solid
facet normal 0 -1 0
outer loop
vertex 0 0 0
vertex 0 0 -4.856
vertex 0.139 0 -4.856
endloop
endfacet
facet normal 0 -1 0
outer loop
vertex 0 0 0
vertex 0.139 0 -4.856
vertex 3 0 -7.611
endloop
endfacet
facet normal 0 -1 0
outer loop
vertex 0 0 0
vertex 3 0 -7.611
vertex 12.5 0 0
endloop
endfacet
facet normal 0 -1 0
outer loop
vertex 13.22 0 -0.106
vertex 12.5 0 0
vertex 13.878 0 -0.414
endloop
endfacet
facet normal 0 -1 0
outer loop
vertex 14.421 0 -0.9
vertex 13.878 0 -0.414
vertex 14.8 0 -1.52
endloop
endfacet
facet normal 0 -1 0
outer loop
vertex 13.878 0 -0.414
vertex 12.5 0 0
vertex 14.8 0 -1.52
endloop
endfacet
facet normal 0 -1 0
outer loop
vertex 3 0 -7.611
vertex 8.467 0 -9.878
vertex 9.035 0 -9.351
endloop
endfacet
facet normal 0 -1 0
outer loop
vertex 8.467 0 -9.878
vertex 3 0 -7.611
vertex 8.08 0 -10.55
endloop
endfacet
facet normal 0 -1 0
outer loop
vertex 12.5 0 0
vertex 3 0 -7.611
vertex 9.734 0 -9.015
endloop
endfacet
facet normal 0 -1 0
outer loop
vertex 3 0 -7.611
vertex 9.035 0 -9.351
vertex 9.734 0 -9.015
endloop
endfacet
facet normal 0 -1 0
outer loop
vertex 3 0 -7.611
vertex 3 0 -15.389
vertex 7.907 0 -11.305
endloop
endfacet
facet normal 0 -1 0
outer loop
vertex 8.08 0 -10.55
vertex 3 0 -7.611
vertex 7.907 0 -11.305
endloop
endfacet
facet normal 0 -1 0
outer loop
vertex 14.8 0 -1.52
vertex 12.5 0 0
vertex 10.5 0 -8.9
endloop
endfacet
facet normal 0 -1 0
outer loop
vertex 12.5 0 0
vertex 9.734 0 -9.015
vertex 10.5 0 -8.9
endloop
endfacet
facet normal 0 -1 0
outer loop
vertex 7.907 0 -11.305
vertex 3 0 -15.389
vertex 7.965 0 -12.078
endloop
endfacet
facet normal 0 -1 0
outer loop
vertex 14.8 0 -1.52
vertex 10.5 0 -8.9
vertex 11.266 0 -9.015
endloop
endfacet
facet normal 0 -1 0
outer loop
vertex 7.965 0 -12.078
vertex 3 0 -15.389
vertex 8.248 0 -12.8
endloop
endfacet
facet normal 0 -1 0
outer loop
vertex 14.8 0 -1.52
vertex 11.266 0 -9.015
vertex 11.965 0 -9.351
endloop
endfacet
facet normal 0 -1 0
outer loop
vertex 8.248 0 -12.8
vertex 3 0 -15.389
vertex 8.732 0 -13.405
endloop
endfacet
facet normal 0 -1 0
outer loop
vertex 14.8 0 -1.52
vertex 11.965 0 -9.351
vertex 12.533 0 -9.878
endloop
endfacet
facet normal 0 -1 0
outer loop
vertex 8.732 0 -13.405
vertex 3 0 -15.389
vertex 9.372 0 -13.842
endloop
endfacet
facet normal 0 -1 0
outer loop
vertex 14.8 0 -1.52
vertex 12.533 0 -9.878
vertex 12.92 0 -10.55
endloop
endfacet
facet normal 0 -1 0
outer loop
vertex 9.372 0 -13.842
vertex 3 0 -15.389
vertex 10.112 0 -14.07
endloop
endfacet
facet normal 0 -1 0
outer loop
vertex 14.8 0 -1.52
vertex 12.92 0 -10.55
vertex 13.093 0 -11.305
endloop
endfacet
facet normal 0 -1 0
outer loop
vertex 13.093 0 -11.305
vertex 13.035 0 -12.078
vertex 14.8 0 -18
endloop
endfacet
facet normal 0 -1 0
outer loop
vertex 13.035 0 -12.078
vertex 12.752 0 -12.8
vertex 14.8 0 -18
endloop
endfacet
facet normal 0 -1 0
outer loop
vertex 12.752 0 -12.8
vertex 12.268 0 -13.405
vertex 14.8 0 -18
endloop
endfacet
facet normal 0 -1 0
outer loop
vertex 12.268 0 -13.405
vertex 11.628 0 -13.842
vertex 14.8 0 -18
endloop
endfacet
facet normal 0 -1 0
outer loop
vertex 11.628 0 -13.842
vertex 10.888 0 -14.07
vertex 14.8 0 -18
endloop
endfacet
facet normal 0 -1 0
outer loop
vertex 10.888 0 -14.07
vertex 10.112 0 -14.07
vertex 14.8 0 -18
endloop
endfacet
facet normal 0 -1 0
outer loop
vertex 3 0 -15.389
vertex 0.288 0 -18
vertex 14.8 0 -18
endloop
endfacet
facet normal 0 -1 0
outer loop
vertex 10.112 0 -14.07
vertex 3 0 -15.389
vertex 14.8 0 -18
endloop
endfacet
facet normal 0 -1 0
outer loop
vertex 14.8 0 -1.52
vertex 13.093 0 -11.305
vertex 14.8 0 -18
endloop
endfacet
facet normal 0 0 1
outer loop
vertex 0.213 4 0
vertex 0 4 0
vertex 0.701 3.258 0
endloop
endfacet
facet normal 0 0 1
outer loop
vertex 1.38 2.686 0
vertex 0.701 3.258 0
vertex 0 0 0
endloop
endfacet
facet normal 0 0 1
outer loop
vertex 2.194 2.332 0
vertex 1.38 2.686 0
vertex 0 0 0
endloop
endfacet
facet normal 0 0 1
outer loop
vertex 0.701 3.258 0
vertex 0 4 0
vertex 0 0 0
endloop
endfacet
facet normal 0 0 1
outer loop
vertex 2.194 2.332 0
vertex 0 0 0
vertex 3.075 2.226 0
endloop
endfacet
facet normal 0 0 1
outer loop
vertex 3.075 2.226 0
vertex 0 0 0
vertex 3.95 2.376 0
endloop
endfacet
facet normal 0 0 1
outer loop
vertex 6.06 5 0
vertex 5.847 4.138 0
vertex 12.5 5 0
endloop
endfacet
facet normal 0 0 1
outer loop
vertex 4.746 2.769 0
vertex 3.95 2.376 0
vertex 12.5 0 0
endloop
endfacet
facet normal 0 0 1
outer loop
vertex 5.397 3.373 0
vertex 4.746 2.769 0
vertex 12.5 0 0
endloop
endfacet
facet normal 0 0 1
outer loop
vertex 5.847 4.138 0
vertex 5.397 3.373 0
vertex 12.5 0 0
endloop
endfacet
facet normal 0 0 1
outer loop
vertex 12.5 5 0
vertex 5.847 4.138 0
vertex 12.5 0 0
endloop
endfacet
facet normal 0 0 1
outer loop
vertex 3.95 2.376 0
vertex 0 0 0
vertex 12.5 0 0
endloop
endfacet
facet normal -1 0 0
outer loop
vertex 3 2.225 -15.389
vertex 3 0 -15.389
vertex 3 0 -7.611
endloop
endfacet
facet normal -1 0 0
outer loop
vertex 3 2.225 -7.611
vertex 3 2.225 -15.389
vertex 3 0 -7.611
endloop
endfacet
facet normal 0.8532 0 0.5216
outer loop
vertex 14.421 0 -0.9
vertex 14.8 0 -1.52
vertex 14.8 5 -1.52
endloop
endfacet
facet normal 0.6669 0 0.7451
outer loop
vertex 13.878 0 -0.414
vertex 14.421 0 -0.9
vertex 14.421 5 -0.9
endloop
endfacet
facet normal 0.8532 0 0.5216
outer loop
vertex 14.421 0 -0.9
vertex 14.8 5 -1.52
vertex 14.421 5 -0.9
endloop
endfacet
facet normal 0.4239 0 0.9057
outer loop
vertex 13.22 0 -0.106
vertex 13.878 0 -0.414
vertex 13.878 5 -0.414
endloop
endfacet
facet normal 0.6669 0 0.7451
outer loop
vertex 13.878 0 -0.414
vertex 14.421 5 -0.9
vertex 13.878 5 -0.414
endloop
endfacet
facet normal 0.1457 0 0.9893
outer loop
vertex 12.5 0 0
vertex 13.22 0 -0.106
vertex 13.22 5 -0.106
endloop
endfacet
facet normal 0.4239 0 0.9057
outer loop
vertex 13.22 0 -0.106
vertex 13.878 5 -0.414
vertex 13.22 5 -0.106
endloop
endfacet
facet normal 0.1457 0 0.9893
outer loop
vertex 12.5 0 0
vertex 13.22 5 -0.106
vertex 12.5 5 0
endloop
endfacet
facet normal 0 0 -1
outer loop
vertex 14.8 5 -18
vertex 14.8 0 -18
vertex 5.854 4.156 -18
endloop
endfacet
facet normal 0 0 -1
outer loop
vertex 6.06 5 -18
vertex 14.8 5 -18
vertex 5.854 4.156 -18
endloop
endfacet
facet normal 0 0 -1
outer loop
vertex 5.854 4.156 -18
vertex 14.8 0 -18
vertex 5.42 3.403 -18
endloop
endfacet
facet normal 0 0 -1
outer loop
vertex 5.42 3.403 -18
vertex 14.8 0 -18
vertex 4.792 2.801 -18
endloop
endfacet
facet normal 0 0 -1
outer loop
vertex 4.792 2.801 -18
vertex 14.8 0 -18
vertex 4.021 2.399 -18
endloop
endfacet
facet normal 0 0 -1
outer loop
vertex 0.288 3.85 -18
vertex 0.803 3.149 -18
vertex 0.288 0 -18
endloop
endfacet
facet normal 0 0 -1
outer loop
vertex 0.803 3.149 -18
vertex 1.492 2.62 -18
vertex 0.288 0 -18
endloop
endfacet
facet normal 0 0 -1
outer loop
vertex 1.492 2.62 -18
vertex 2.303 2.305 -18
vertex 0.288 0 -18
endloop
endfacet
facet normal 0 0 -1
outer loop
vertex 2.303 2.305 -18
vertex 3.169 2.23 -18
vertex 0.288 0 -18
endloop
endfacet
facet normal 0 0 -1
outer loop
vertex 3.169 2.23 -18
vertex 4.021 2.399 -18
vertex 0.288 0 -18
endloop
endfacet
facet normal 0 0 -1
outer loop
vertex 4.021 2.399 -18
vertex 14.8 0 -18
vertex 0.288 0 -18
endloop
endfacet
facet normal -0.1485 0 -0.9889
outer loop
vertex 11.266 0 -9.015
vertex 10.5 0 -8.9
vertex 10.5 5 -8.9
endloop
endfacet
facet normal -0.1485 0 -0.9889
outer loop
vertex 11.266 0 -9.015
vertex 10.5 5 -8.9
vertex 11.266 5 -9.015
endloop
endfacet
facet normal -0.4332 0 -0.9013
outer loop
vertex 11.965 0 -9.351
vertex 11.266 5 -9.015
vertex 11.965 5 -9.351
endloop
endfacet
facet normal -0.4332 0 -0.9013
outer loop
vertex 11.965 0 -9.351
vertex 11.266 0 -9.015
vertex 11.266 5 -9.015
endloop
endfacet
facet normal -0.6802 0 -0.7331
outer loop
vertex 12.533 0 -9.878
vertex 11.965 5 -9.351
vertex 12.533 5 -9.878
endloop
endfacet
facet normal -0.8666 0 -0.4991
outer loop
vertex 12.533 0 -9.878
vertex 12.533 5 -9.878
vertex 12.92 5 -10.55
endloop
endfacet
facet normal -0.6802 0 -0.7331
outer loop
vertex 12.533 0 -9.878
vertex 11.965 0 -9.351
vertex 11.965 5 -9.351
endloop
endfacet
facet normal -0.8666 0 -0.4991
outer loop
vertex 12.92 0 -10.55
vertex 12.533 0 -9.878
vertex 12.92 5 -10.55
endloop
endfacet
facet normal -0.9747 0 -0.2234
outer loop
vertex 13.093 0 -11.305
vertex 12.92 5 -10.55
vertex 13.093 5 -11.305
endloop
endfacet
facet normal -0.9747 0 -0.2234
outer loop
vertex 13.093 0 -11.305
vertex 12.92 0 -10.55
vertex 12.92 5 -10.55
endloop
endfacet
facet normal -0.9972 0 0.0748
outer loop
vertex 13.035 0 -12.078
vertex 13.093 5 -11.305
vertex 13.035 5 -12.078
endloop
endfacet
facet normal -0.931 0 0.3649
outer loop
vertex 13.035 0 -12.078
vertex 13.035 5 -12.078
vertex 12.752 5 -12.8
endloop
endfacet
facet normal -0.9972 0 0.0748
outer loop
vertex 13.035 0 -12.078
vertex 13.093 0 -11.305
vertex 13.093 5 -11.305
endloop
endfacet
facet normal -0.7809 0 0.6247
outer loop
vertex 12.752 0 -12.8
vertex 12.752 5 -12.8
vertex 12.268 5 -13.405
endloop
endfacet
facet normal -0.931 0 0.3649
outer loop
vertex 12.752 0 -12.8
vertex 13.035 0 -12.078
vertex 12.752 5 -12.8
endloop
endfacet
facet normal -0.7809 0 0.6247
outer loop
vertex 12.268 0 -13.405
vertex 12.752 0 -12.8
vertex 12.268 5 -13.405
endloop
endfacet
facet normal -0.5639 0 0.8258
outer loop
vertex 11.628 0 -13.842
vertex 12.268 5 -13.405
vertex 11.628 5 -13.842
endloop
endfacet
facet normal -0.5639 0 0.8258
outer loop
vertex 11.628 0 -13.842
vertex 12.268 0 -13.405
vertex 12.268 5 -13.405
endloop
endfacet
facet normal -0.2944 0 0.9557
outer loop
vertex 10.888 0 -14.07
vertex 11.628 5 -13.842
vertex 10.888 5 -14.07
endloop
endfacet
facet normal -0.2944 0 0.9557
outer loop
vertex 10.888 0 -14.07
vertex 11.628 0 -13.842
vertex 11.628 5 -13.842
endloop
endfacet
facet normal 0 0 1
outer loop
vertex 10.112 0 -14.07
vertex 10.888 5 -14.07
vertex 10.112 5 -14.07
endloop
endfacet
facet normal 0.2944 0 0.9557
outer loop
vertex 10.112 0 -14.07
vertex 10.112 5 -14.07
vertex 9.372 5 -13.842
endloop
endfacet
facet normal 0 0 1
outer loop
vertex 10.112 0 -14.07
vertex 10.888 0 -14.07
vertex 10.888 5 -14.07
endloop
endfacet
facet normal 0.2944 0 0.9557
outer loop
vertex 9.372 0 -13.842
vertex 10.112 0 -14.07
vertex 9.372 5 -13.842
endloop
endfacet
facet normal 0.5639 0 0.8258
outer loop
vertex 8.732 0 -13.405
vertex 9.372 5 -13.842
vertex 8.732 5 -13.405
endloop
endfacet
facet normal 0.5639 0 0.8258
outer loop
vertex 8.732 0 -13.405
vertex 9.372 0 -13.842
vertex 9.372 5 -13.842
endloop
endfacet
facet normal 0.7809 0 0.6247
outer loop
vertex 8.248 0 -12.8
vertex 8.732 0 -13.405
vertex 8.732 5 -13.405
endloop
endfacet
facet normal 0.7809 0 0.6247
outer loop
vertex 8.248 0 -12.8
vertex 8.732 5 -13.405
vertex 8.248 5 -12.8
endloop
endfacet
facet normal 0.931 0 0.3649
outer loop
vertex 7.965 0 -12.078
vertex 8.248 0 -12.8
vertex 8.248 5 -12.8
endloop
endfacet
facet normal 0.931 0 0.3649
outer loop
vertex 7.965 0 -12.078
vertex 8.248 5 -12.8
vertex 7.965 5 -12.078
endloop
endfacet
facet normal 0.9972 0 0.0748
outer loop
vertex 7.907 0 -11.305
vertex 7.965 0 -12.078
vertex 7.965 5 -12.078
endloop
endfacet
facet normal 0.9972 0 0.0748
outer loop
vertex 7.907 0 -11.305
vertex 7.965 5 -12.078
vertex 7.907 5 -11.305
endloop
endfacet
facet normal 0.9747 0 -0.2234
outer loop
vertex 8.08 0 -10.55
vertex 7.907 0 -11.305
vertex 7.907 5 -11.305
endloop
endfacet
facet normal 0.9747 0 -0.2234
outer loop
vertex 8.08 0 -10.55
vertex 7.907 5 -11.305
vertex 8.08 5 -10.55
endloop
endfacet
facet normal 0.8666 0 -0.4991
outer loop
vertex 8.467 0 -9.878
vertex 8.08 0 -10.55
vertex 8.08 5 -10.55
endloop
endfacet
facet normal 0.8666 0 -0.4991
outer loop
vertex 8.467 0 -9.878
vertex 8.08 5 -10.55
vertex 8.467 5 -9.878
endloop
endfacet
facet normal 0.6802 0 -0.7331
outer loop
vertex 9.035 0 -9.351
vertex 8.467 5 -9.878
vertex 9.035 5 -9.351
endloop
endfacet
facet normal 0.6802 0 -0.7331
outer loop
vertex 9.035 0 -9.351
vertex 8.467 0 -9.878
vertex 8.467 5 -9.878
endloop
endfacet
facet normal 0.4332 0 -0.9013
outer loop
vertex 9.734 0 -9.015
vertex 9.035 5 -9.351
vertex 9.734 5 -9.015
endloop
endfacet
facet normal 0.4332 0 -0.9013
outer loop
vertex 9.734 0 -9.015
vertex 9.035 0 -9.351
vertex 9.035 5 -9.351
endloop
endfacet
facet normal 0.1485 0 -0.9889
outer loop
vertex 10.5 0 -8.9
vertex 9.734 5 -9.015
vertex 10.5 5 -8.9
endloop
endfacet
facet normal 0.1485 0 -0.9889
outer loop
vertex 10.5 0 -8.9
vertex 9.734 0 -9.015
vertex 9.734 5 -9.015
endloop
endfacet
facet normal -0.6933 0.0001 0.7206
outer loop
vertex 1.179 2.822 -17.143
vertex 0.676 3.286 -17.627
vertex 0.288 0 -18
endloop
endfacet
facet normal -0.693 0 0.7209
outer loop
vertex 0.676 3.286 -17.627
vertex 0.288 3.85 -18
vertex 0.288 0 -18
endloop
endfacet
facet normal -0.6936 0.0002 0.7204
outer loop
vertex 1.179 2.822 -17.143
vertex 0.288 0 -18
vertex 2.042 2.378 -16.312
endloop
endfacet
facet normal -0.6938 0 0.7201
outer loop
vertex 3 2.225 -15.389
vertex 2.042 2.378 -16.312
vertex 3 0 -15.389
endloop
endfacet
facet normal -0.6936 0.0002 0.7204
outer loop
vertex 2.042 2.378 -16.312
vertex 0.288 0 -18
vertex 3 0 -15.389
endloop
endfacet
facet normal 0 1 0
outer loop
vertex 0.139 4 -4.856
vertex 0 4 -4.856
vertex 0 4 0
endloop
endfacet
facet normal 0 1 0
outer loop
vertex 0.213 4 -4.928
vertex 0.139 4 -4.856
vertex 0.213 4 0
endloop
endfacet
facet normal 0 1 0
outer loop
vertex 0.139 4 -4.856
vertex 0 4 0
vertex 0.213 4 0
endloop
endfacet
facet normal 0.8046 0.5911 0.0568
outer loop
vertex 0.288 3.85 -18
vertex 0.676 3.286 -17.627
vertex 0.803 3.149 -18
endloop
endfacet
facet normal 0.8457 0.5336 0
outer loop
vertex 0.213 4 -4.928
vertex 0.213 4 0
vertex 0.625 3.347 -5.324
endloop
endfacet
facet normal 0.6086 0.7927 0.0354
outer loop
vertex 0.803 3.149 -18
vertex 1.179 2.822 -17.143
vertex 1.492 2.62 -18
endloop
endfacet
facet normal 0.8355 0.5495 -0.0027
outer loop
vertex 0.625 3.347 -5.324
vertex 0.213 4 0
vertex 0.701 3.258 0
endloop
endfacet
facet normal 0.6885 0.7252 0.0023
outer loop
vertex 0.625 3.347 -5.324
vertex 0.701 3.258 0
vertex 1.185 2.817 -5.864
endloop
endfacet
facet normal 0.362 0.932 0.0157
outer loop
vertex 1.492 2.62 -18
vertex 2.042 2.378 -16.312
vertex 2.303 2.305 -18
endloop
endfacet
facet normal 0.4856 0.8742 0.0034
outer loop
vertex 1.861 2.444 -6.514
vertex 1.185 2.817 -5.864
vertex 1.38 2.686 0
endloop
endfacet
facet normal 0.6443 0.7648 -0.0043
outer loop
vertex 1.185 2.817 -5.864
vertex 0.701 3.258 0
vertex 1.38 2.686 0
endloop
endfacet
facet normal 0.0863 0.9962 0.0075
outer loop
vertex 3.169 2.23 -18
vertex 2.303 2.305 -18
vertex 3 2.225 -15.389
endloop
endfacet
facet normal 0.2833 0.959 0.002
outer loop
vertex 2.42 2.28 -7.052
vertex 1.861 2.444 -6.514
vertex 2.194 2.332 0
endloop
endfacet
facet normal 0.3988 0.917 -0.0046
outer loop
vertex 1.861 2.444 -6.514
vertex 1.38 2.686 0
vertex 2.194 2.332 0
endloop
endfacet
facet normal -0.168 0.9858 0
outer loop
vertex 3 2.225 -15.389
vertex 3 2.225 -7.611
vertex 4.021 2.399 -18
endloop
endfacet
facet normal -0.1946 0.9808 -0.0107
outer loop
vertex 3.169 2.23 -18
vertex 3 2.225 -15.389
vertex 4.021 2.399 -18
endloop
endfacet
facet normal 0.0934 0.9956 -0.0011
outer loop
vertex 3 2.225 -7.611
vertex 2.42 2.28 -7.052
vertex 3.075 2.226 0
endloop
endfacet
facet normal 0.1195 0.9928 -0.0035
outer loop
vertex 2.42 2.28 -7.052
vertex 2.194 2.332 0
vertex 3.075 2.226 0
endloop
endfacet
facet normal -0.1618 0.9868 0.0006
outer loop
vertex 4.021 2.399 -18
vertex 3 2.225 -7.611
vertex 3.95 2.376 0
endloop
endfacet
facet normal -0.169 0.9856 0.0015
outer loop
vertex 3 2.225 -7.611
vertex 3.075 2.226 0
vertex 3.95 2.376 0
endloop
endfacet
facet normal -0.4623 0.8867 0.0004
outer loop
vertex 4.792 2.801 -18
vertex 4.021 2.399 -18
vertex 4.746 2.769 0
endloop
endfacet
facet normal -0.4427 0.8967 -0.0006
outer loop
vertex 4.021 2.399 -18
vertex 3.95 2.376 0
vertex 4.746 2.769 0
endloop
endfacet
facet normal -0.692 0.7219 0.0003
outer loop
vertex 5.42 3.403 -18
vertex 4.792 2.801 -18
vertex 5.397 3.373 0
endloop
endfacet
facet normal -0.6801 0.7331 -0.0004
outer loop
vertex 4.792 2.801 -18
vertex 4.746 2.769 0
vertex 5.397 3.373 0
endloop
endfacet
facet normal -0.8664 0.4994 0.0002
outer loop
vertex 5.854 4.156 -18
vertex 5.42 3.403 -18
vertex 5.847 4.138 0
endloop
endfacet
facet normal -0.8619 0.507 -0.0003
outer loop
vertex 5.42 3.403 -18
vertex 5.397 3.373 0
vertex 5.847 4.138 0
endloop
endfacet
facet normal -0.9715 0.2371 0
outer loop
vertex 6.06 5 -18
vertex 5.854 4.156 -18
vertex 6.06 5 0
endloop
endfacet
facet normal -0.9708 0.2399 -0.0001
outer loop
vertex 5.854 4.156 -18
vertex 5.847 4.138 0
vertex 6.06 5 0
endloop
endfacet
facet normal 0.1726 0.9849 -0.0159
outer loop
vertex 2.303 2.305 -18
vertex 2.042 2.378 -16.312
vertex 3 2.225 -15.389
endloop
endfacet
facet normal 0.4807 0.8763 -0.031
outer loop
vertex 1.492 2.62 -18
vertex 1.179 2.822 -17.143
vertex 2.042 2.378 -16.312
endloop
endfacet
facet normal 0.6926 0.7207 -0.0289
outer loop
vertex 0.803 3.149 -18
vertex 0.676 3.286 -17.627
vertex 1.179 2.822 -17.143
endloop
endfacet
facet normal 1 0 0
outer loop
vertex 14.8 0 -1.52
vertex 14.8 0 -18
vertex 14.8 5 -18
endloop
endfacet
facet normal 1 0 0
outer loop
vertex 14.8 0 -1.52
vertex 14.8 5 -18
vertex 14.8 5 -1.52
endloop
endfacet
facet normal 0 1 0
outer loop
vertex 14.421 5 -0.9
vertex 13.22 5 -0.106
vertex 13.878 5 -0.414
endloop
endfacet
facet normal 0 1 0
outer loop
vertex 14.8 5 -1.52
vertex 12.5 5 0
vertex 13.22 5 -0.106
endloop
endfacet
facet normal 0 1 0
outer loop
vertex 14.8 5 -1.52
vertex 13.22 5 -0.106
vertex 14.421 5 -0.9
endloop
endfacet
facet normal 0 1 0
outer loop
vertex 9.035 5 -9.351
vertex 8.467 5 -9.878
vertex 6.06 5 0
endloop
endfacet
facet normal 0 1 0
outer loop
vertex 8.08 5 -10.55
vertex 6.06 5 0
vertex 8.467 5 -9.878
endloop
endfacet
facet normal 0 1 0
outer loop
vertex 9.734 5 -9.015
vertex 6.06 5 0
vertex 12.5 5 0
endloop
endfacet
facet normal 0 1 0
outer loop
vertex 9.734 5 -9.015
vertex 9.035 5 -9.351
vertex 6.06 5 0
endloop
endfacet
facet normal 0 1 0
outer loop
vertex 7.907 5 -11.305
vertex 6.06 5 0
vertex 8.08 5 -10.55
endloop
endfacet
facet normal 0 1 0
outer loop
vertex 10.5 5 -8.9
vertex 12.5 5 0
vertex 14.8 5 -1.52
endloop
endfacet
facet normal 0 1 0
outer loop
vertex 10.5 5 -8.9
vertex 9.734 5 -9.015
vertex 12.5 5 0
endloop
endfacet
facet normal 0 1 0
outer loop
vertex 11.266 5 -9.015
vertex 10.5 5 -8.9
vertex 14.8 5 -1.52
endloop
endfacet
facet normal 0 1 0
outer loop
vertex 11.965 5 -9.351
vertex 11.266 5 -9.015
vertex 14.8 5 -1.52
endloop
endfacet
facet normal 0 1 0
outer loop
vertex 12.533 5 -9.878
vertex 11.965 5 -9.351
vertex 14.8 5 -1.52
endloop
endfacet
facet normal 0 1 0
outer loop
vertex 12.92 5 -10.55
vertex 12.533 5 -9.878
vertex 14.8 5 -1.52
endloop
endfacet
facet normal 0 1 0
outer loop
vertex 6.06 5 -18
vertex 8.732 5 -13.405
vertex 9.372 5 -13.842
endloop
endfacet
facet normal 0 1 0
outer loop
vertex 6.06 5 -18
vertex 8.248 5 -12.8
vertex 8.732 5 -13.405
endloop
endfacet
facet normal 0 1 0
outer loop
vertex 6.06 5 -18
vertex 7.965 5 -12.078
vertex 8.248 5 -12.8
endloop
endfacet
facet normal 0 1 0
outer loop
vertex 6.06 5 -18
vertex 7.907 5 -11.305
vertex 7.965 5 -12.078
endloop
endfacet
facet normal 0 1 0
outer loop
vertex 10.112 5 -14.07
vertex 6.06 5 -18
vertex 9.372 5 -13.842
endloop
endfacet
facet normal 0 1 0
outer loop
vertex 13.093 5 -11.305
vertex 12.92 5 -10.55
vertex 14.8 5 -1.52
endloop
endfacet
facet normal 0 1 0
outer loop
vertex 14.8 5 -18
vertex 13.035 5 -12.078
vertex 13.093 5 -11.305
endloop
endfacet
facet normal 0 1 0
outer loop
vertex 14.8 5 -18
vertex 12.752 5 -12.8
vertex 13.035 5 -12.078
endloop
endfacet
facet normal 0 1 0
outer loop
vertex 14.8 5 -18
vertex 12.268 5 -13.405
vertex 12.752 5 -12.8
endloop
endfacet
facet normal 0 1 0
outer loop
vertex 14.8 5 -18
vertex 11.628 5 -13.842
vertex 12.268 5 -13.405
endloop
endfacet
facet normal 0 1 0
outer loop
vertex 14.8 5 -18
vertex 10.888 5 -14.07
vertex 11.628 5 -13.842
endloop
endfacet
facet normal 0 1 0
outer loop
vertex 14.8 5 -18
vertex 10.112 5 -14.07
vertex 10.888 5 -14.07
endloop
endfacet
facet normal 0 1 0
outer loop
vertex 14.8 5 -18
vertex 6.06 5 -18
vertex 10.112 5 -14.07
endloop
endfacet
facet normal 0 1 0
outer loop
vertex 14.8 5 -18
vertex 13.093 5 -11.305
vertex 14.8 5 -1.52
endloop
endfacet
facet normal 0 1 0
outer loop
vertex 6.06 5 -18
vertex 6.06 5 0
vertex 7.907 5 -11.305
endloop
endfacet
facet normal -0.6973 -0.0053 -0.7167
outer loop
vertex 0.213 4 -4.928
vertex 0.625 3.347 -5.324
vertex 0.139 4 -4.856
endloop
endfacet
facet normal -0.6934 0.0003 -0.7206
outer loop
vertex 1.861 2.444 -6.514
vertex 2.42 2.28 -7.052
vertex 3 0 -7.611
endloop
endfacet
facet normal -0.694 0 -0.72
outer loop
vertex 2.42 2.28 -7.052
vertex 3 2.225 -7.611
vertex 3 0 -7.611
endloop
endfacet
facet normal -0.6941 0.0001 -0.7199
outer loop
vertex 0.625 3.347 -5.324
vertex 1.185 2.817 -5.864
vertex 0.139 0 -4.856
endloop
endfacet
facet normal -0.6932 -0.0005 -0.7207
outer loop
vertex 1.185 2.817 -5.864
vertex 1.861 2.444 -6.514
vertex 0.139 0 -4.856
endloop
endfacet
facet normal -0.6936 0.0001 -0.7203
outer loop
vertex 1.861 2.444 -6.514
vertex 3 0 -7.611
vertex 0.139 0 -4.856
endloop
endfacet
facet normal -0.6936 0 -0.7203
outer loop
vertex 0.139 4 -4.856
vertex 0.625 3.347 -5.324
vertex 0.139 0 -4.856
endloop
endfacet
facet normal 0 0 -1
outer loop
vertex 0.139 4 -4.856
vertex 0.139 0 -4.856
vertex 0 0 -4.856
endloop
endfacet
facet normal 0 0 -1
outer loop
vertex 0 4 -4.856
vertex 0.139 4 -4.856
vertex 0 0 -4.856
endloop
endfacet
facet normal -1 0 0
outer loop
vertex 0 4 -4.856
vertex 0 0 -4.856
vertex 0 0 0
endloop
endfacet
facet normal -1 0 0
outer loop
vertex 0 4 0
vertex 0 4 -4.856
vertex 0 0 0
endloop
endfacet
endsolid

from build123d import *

# Parameters (mm, degrees)
BOSS_EXTRUDE1_DEPTH      = 5
BOSS_EXTRUDE1_DEPTH_BACK = 0.0001
SKETCH1_R                = 2.6
SKETCH2_R                = 3.075
CUT_EXTRUDE1_DEPTH       = 24.958297101
FILLET1_R                = 2.5
SKETCH3_W                = 0.717338371
SKETCH3_H                = 1
CUT_EXTRUDE2_DEPTH       = 24.958297101
SKETCH4_W                = 0.2
SKETCH4_H                = 18
CUT_EXTRUDE3_DEPTH       = 24.958317971


with BuildPart() as part:
    # Sketch1 → Boss-Extrude1 (new, two sides: drawn at the far end of the back side and taken through both)
    with BuildSketch(Plane(origin=(0, 0, 0), x_dir=(1, 0, 0), z_dir=(0, 1, 0)).offset(-BOSS_EXTRUDE1_DEPTH_BACK)):
        Polygon((0, 18), (2.8, 15.304069131), (2.8, 7.695628029), (0, 5), (0, 0), (15, 0), (15, 18), align=None)
        with Locations(Location((10.5, 11.499529694, 0), (0, 0, 270))):
            Circle(SKETCH1_R, mode=Mode.SUBTRACT)
    extrude(amount=BOSS_EXTRUDE1_DEPTH + BOSS_EXTRUDE1_DEPTH_BACK)

    # Sketch2 → Cut-Extrude1 (cut, through all)
    with BuildSketch(Plane.XY):
        with Locations((3, 5.3)):
            Circle(SKETCH2_R)
    extrude(amount=-CUT_EXTRUDE1_DEPTH, mode=Mode.SUBTRACT)

    # Fillet1
    fillet1_edges = [part.edges().sort_by_distance(p)[0] for p in [
        (15, 2.49995, 0),
    ]]
    fillet(fillet1_edges, radius=FILLET1_R)

    # Sketch3 → Cut-Extrude2 (cut, through all)
    with BuildSketch(Plane.XY):
        with Locations((0.358669186, 4.5)):
            Rectangle(SKETCH3_W, SKETCH3_H)
    extrude(amount=-CUT_EXTRUDE2_DEPTH, mode=Mode.SUBTRACT)

    # Sketch4 → Cut-Extrude3 (cut, through all)
    with BuildSketch(Plane.XZ.offset(0.0001)):
        Polygon((0.138710494, -4.855918777), (-0.903561635, -4.855918777), (-0.903561635, -18.144073437), (0.138718581, -18.144073437), (3, -15.389138829), (3, -7.610551703), align=None)
        with Locations((14.9, -9)):
            Rectangle(SKETCH4_W, SKETCH4_H)
    extrude(amount=-CUT_EXTRUDE3_DEPTH, mode=Mode.SUBTRACT)


solid = part.part
